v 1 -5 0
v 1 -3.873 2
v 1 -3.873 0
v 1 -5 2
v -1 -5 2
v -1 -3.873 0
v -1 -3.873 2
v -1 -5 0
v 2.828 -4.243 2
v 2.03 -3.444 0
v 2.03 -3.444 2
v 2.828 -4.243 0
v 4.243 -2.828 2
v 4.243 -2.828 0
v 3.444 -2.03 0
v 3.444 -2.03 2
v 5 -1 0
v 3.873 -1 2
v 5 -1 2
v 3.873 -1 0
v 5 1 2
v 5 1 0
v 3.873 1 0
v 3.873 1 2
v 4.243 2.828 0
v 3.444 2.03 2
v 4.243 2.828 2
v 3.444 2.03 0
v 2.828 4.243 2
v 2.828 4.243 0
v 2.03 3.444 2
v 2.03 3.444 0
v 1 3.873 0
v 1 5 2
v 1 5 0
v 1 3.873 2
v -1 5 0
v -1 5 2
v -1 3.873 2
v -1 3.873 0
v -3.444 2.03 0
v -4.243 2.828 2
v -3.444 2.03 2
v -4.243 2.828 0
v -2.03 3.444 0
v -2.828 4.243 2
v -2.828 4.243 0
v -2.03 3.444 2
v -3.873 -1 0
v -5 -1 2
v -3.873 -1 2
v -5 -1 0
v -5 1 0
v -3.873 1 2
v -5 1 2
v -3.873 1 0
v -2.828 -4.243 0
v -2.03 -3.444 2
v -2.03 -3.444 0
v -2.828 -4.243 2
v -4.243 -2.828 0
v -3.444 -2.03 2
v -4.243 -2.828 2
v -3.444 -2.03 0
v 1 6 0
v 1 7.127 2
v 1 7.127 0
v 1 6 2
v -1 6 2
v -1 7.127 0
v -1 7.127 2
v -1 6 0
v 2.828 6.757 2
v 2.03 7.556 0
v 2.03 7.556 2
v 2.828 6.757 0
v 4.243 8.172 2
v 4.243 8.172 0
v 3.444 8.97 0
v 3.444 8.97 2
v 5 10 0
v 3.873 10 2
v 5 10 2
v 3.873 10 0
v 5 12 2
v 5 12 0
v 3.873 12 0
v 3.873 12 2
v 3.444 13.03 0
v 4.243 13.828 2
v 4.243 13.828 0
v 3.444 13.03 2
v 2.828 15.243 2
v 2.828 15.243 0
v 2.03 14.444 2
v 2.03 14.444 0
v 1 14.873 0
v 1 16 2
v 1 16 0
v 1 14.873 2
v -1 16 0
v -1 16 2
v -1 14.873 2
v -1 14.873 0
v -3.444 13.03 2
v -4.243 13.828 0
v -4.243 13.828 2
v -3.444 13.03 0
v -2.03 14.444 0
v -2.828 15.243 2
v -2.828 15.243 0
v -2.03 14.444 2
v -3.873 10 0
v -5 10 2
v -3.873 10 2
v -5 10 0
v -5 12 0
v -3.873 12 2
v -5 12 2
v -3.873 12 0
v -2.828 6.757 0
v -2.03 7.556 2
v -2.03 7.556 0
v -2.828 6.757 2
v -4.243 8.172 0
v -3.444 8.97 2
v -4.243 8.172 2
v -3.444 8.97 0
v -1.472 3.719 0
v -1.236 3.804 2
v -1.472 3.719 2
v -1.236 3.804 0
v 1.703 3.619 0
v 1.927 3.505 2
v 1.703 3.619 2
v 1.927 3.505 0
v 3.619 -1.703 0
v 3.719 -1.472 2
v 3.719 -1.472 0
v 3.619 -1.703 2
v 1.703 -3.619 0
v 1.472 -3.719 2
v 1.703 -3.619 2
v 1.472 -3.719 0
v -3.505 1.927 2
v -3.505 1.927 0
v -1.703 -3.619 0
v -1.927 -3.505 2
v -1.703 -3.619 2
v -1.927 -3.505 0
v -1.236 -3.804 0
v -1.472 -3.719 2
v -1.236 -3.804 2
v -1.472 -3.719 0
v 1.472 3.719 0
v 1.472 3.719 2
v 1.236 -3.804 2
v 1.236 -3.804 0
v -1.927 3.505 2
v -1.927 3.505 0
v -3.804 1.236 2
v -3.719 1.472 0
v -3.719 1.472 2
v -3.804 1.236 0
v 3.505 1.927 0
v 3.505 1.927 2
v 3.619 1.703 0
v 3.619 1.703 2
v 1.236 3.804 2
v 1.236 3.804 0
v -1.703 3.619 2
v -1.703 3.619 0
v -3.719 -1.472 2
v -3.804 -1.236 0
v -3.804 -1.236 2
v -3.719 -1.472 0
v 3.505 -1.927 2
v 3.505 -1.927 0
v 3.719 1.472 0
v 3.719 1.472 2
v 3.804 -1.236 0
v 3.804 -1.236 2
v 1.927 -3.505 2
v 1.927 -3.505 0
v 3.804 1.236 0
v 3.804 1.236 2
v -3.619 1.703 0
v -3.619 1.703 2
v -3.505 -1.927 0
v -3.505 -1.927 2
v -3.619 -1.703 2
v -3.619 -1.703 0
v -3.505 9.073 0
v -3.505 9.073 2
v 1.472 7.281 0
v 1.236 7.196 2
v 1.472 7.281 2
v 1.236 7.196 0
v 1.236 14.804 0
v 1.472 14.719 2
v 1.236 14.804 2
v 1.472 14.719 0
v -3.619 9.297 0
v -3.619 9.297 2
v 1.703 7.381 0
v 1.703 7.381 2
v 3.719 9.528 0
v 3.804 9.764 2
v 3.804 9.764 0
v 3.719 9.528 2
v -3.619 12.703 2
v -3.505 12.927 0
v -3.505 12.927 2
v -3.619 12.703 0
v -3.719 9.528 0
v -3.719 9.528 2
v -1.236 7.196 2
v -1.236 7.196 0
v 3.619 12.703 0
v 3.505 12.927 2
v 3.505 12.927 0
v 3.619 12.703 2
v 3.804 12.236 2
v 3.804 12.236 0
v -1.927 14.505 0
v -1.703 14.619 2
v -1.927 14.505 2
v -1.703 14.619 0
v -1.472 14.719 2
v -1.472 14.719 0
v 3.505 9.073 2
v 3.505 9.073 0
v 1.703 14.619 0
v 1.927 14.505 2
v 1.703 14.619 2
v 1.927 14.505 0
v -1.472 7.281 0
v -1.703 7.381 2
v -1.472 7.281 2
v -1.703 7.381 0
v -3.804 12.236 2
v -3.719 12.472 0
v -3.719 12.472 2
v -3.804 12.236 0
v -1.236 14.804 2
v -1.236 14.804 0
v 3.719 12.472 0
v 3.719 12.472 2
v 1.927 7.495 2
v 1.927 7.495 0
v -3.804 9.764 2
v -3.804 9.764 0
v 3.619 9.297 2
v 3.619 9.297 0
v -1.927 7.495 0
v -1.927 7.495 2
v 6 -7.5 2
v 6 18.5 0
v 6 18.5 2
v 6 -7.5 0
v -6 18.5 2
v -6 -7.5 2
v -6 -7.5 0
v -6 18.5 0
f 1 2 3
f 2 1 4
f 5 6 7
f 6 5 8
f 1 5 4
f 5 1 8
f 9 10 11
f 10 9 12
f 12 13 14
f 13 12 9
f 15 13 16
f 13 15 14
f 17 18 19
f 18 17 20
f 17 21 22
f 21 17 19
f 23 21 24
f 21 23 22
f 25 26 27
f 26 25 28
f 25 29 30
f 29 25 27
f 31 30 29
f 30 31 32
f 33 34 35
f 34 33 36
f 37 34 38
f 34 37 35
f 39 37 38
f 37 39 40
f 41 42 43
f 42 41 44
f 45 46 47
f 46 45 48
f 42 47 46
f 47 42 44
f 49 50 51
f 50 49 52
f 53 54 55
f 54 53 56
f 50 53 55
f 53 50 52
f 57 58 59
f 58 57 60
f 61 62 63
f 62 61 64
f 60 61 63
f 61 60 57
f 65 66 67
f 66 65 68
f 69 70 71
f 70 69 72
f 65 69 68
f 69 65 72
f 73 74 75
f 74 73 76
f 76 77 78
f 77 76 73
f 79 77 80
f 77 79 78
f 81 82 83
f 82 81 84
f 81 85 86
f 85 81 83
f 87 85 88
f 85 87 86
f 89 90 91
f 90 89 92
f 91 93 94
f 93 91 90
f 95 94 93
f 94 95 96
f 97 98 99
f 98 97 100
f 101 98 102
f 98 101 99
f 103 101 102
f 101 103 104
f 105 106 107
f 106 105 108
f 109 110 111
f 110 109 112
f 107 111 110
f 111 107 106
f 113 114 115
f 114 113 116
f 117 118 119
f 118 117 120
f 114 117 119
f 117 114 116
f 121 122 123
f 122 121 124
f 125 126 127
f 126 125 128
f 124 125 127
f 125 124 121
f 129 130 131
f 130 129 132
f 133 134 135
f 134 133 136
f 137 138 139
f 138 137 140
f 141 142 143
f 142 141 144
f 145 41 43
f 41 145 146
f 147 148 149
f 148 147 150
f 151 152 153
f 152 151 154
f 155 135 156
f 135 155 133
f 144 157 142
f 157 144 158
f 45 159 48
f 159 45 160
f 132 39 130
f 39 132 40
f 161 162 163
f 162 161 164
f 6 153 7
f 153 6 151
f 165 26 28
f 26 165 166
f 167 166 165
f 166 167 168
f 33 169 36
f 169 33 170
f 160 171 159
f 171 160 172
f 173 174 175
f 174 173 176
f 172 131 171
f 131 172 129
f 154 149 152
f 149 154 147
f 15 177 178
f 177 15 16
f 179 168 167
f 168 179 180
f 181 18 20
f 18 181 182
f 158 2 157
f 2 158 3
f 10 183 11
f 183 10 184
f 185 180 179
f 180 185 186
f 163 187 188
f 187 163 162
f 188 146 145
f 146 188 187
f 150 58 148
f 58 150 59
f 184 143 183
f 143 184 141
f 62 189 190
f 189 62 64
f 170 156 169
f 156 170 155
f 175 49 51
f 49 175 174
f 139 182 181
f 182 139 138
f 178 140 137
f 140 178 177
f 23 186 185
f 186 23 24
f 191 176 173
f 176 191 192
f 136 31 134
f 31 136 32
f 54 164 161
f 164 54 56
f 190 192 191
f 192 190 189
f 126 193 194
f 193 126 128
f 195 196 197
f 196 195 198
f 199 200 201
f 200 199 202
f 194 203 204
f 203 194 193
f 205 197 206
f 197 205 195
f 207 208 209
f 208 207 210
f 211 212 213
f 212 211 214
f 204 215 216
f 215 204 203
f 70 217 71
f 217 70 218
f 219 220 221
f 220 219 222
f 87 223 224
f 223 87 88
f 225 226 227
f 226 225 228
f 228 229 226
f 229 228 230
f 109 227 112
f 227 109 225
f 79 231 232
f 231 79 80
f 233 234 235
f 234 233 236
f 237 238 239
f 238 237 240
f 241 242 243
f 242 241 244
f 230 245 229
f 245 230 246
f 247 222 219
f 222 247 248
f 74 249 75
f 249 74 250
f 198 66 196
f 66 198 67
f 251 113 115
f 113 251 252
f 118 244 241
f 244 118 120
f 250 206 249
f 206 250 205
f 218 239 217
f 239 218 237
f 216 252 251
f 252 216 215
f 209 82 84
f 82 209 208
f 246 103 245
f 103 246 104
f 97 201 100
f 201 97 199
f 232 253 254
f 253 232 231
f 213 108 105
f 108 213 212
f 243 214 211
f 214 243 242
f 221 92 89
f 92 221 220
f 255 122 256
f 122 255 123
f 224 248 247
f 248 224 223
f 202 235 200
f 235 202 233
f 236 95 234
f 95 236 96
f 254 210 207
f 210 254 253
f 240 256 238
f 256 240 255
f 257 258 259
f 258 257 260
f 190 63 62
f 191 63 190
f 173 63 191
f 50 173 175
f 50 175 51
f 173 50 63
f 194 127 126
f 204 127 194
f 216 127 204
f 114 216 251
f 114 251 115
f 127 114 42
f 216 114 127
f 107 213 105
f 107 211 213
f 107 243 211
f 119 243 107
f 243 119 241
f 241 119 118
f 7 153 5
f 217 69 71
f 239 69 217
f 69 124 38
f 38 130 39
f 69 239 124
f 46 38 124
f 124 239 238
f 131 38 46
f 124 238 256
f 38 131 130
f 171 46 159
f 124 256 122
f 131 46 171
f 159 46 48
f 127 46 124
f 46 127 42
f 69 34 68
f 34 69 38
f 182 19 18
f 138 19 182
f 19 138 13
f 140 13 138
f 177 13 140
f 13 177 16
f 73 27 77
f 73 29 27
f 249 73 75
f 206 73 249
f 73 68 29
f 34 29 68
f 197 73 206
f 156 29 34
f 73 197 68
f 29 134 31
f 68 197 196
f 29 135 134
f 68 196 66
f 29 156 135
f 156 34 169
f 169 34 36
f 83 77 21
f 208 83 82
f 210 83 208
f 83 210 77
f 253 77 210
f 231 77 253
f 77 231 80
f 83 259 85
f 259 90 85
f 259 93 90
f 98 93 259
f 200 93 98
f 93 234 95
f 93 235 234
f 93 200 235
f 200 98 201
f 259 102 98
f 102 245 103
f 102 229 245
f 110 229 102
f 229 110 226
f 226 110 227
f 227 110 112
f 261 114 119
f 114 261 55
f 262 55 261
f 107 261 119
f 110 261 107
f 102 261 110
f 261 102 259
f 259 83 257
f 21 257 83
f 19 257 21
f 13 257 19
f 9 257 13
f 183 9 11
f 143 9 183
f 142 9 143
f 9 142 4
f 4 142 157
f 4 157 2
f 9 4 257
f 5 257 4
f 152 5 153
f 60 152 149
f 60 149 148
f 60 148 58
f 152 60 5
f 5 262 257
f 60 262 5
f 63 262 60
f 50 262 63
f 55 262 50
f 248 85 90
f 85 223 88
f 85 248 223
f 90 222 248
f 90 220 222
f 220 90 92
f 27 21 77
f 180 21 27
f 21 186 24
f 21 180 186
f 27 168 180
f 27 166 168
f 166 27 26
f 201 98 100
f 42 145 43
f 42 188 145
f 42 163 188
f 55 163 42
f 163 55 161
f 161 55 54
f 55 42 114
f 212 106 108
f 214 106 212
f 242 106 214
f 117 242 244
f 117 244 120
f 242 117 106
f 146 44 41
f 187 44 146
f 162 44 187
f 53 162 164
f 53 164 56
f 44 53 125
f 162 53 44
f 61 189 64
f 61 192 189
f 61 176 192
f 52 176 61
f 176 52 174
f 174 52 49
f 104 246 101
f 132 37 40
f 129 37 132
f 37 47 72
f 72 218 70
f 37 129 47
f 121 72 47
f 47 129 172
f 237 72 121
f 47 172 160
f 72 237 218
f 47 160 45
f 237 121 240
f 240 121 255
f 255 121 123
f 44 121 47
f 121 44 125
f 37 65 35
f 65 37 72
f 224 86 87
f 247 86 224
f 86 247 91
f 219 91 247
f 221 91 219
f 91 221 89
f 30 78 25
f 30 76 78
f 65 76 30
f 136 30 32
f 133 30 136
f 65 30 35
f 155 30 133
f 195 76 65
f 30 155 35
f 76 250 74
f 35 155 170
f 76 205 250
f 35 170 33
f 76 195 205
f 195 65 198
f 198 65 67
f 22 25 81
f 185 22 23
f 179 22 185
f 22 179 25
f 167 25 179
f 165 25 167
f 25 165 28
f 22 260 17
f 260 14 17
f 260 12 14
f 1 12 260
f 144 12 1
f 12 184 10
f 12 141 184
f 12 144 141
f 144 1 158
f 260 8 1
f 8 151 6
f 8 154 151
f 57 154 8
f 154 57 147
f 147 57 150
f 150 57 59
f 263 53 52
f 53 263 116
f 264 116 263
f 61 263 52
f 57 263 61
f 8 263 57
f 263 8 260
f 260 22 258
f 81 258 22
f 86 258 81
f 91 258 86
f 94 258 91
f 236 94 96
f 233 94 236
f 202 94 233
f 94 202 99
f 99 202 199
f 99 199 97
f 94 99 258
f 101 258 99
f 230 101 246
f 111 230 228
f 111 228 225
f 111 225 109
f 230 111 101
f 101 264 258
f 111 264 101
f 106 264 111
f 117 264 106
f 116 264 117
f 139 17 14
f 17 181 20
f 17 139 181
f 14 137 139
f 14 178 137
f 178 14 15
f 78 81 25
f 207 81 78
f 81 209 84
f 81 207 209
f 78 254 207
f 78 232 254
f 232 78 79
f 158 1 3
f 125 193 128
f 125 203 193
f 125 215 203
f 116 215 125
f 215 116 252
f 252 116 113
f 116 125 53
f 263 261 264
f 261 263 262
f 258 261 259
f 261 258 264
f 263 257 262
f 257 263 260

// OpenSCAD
difference(){
	union(){

        translate([-6,-7.5,0]){
            cube([12,15+11,2], center=false);
        }
	}
	union() {

         translate([0,0,0]){
            for (hoek =[0:45:360])
            rotate([0,0,hoek]){
                translate([-1,-5,-20]){
                    rotate([0,0,0]){
                        color("red")
                        cube([2,5,40], center=false);
                    }
                }
            }
        }

         translate([0,11,0]){
            for (hoek =[0:45:360])
            rotate([0,0,hoek]){
                translate([-1,-5,-20]){
                    rotate([0,0,0]){
                        color("red")
                        cube([2,5,40], center=false);
                    }
                }
            }
        }


        translate([0,0,-15]){
            rotate([0,0,90]){
                color("green")
                cylinder(h=30, r=4, $fn=100, center=false);
            }
        }
        translate([0,11,-15]){
            rotate([0,0,90]){
                color("green")
                cylinder(h=30, r=4, $fn=100, center=false);
            }
        }


	}
}
